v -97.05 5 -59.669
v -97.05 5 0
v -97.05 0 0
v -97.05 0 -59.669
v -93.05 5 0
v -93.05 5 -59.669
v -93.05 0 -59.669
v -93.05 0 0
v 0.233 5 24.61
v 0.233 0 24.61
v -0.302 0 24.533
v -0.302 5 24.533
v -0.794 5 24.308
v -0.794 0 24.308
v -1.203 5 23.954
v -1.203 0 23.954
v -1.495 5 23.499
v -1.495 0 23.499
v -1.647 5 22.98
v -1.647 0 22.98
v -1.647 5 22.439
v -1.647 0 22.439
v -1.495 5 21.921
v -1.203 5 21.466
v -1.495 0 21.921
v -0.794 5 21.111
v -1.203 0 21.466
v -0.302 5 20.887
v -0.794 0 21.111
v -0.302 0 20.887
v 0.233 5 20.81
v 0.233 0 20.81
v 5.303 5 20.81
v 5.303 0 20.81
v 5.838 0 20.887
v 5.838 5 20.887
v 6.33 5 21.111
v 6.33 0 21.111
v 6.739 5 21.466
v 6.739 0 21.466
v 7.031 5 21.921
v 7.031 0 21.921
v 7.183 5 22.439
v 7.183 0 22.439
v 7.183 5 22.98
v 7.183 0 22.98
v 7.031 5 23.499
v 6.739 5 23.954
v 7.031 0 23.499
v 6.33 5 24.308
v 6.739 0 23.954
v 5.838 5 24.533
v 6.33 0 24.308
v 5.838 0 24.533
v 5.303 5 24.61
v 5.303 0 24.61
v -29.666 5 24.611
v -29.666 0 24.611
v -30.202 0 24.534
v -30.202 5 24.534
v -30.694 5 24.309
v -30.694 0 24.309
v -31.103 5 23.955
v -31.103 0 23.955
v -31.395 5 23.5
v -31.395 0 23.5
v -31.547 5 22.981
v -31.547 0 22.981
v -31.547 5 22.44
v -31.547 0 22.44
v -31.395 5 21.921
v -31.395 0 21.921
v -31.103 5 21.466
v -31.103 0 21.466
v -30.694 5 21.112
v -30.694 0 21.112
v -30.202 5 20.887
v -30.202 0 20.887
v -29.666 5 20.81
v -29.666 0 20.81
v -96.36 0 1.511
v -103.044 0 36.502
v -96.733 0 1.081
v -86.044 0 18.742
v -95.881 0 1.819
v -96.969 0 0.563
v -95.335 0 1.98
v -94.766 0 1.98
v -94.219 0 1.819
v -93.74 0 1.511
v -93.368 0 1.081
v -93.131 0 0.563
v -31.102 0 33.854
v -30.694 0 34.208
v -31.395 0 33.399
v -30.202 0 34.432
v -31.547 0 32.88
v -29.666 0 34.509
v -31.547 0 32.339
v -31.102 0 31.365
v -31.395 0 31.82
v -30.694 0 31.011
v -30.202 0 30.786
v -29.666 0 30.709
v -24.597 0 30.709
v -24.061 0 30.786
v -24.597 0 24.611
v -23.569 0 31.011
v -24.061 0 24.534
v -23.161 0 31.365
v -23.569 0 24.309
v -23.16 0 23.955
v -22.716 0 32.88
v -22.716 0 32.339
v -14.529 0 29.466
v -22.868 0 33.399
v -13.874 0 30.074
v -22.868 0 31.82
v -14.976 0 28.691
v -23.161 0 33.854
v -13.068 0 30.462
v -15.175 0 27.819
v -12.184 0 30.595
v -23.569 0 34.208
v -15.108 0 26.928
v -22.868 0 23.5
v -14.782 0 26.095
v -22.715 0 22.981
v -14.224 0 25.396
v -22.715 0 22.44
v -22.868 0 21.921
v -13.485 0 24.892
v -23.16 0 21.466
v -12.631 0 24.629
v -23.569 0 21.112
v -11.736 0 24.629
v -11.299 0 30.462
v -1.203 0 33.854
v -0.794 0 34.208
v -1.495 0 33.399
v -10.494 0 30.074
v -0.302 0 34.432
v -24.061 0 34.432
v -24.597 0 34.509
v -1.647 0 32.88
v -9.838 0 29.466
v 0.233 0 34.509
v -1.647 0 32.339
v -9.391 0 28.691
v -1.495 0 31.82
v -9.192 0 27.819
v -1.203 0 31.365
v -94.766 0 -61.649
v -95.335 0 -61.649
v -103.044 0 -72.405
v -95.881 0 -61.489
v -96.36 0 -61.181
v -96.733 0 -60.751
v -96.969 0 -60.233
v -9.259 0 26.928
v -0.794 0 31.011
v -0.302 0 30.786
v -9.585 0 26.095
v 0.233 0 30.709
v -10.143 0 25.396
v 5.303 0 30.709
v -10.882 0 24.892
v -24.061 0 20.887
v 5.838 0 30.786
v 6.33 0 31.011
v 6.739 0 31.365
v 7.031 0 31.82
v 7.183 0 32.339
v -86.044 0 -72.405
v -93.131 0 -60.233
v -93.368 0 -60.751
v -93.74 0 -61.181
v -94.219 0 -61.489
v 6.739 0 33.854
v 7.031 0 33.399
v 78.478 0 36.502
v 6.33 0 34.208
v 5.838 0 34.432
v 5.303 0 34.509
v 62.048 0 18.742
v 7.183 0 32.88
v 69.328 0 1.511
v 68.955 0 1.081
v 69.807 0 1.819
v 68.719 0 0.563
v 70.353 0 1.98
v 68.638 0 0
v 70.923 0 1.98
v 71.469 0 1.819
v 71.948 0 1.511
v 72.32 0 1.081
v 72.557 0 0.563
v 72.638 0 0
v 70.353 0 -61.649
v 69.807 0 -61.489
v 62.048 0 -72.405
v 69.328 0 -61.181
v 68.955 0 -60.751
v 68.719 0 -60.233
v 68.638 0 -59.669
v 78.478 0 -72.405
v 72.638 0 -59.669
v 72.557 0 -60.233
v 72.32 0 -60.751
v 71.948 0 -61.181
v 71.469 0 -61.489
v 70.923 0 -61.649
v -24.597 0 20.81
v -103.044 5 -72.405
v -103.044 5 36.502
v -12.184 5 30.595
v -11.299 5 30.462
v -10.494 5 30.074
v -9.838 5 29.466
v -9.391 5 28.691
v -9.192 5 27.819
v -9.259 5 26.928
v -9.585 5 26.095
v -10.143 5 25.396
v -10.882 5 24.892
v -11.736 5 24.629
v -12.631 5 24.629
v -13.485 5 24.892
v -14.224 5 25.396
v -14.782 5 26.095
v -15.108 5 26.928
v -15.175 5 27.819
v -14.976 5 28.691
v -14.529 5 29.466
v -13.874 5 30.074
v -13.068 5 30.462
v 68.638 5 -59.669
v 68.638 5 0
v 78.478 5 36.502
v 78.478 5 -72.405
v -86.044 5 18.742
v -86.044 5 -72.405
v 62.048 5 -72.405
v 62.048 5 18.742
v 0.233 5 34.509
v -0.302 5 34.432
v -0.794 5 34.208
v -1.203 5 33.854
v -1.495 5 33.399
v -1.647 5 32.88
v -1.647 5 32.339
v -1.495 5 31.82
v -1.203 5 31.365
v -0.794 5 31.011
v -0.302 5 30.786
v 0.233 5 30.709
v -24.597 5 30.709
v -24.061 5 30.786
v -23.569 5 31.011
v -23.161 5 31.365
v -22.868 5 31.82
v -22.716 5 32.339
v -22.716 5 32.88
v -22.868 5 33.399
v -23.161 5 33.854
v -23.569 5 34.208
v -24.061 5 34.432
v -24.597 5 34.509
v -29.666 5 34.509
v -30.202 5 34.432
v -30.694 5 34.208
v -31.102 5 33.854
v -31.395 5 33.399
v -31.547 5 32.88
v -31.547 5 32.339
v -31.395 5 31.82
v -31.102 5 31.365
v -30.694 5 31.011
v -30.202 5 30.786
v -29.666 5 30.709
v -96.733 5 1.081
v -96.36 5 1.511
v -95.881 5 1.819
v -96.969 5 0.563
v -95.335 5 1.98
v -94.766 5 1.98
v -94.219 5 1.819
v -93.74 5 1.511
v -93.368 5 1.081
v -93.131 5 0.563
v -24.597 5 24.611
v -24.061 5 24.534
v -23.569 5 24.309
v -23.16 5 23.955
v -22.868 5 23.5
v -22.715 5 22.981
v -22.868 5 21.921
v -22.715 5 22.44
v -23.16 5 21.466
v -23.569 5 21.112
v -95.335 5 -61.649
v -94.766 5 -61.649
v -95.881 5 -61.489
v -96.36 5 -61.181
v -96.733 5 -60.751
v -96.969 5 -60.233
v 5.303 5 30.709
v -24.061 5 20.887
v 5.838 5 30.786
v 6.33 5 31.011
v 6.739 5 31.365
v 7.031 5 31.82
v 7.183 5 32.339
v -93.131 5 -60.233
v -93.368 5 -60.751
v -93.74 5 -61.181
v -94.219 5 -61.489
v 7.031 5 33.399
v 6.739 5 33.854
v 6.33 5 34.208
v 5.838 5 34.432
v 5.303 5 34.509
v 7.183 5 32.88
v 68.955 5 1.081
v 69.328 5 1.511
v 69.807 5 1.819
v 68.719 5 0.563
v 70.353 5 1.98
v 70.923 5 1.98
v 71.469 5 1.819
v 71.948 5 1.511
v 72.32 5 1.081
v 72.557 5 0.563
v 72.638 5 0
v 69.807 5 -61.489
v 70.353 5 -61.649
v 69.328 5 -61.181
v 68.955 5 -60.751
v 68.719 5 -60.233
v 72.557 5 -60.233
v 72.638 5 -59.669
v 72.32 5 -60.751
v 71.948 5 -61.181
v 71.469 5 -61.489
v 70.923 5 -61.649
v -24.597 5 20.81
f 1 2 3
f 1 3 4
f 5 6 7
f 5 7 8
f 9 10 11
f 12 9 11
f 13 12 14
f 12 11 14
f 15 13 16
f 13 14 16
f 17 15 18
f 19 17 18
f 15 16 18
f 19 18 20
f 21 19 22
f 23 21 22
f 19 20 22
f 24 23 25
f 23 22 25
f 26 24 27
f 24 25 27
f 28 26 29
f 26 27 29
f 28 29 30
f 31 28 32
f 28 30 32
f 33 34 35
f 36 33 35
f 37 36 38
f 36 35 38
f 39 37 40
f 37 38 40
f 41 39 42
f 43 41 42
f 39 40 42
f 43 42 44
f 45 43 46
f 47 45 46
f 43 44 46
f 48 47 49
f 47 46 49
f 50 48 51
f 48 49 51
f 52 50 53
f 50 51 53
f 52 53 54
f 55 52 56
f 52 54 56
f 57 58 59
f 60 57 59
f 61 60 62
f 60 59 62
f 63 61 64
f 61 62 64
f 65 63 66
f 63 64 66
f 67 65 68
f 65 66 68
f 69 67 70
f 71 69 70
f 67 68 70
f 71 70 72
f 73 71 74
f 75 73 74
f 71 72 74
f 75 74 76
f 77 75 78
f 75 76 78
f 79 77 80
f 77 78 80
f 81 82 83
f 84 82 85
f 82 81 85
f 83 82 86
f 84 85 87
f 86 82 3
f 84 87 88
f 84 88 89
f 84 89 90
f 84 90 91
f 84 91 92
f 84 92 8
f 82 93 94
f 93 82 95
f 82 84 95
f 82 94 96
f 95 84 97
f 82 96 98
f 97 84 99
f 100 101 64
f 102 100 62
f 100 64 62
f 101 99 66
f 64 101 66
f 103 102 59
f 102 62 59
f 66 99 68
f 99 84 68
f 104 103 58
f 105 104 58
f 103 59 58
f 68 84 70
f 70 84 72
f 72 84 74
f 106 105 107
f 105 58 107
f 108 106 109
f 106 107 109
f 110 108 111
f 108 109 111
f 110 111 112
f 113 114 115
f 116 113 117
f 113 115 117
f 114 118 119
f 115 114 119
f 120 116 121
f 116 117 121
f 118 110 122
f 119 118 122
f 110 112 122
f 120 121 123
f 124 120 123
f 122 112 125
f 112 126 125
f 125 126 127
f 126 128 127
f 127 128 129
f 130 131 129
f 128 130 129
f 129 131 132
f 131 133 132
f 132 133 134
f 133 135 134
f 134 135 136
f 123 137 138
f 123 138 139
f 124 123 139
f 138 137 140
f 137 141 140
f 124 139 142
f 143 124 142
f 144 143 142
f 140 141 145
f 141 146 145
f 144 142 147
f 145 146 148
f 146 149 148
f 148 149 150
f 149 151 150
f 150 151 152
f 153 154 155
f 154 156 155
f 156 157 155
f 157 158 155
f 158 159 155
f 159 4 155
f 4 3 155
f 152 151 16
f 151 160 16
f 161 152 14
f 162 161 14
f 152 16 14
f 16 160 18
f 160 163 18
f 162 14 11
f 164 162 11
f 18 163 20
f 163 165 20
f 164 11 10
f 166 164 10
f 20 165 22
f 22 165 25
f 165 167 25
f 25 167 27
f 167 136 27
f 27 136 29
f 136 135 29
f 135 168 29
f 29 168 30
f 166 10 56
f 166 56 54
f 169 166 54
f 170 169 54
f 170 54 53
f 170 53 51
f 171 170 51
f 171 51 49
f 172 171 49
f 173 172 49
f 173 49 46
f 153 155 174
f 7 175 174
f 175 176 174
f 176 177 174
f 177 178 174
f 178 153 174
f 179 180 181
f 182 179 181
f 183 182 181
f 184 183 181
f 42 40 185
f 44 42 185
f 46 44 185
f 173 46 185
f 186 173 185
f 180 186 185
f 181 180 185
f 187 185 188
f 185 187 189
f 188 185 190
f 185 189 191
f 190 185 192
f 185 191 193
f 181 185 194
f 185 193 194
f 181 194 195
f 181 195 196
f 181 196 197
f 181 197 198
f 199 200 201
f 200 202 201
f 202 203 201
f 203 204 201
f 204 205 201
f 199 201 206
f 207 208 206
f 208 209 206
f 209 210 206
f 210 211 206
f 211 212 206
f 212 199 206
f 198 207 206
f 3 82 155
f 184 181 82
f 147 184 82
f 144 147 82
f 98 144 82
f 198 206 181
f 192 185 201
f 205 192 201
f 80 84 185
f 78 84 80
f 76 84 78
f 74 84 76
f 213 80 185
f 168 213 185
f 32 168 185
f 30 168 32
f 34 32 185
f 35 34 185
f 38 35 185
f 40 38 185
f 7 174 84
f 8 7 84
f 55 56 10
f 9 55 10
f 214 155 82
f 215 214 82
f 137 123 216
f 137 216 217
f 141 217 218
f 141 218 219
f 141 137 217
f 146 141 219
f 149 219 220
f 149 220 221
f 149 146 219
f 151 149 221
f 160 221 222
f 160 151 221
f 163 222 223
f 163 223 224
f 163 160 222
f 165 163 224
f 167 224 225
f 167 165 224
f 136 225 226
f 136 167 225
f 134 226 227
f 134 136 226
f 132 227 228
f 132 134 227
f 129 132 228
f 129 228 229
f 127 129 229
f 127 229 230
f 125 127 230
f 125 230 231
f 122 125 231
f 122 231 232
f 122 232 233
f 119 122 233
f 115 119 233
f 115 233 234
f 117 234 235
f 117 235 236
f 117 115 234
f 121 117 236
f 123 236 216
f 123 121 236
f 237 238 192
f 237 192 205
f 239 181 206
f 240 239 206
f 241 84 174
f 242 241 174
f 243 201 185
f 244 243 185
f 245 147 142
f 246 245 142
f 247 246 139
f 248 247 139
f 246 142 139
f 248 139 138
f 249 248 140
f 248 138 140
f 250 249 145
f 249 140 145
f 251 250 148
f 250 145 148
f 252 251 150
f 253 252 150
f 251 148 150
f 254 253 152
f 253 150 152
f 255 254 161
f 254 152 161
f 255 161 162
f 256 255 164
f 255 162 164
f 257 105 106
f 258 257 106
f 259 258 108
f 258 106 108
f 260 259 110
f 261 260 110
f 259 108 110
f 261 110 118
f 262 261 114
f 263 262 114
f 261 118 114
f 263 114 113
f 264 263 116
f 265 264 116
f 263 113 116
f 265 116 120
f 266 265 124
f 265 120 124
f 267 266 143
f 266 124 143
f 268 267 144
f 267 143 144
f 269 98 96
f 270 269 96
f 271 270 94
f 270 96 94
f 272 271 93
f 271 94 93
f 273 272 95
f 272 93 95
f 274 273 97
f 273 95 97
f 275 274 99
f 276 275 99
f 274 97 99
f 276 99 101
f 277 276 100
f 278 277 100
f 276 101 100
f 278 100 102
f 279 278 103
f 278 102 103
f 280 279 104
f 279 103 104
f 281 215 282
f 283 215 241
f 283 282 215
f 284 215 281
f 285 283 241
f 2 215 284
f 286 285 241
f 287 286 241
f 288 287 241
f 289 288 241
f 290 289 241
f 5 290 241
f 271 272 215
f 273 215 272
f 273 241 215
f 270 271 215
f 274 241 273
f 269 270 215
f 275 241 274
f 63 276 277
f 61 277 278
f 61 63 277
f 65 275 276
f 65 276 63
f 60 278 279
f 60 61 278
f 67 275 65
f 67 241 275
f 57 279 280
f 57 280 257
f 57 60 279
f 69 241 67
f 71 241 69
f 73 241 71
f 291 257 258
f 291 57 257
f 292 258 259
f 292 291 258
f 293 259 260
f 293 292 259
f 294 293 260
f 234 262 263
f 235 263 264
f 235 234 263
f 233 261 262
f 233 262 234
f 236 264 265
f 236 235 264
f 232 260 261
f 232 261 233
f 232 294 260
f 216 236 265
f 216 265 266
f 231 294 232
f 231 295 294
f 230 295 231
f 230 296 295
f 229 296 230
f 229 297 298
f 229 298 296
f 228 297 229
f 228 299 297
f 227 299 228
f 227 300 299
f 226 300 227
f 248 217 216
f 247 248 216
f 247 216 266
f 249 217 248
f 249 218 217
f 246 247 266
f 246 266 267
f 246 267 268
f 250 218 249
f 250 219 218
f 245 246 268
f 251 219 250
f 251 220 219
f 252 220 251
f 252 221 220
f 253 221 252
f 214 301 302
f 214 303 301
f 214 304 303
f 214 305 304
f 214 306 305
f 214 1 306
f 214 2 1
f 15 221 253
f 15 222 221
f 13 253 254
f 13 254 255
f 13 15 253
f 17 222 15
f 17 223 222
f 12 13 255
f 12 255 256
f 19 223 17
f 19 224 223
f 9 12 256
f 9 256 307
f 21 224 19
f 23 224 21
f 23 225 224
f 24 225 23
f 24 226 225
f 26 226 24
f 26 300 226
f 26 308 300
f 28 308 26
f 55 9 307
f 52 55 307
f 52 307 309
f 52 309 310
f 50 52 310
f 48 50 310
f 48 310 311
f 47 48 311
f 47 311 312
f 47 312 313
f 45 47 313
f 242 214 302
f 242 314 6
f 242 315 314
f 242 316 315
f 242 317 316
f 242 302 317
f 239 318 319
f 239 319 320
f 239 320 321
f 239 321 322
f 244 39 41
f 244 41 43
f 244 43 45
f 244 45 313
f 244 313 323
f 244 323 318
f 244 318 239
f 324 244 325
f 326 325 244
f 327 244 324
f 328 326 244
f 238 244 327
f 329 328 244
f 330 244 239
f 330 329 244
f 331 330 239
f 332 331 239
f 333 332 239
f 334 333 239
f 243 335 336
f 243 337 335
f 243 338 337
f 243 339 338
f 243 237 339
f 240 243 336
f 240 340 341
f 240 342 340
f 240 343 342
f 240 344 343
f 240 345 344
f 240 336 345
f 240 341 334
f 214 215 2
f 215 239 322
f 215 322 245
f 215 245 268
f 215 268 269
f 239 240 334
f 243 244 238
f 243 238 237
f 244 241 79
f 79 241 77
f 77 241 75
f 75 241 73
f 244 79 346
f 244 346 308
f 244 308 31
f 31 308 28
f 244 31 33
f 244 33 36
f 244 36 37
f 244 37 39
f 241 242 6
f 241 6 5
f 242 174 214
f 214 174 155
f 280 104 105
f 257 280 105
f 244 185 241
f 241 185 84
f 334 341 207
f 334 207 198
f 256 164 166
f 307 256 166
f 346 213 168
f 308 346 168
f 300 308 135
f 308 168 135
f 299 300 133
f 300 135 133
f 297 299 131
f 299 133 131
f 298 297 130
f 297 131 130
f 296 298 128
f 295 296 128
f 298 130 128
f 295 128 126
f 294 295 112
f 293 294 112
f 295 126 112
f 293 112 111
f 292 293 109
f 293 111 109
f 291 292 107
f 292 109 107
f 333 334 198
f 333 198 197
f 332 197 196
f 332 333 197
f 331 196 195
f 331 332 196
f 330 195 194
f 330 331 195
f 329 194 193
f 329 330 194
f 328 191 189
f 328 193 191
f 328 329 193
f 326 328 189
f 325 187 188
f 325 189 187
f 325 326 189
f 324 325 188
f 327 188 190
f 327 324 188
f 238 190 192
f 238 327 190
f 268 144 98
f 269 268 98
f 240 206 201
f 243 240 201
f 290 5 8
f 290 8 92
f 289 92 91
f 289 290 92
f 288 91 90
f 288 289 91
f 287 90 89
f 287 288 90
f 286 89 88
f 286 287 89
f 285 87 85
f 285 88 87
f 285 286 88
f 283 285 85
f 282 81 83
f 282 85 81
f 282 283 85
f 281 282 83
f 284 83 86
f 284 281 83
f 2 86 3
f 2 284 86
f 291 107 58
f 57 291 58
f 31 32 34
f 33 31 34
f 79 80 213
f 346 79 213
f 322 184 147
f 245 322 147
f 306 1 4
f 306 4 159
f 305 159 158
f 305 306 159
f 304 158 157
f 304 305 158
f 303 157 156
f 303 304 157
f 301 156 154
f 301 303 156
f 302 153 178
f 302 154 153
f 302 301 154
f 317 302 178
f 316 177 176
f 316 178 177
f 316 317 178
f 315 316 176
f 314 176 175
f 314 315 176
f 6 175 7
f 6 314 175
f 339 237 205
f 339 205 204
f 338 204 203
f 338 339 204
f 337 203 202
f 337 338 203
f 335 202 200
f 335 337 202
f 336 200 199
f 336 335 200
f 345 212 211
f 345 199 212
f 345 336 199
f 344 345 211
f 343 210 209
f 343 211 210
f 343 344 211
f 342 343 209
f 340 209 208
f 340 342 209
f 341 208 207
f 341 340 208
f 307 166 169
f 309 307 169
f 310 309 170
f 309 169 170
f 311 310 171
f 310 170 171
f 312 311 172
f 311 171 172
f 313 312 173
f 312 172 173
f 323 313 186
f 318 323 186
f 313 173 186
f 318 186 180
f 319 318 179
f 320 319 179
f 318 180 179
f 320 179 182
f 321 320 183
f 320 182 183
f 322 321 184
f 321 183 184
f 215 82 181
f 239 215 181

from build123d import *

# Parameters (mm, degrees)
SKETCH_5_R          = 3
EXTRUDE_4_DEPTH     = 5
CUT_EXTRUDE_2_DEPTH = 8.5
CUT_EXTRUDE_4_DEPTH = 8.5


with BuildPart() as part:
    # 草图5 → 凸台-拉伸4 (new body)
    with BuildSketch(Plane(origin=(0, 0, 0), x_dir=(1, 0, 0), z_dir=(0, 1, 0))):
        Polygon((-103.043555275, 72.404841583), (-103.043555275, -36.501510282), (78.477843527, -36.501510282), (78.477843527, 72.404841583), (62.047530944, 72.404841583), (62.047530944, -18.742135335), (-86.043555275, -18.742135335), (-86.043555275, 72.404841583), align=None)
        with BuildLine():
            Line((0.233182571, -20.809880528), (5.30281271, -20.809880528))
            ThreePointArc((5.30281271, -20.809880528), (7.20281271, -22.709880528), (5.30281271, -24.609880528))
            Line((5.30281271, -24.609880528), (0.233182571, -24.609880528))
            ThreePointArc((0.233182571, -24.609880528), (-1.666817429, -22.709880528), (0.233182571, -20.809880528))
        make_face(mode=Mode.SUBTRACT)
        with BuildLine():
            ThreePointArc((-29.666312365, -34.509375465), (-31.566312365, -32.609375465), (-29.666312365, -30.709375465))
            Line((-29.666312365, -30.709375465), (-24.596682227, -30.709375465))
            ThreePointArc((-24.596682227, -30.709375465), (-22.696682227, -32.609375465), (-24.596682227, -34.509375465))
            Line((-24.596682227, -34.509375465), (-29.666312365, -34.509375465))
        make_face(mode=Mode.SUBTRACT)
        with BuildLine():
            ThreePointArc((-29.666312365, -24.610941368), (-31.566842785, -22.710410948), (-29.666312365, -20.809880528))
            Line((-29.666312365, -20.809880528), (-24.596682227, -20.809880528))
            ThreePointArc((-24.596682227, -20.809880528), (-22.696151807, -22.710410948), (-24.596682227, -24.610941368))
            Line((-24.596682227, -24.610941368), (-29.666312365, -24.610941368))
        make_face(mode=Mode.SUBTRACT)
        with BuildLine():
            ThreePointArc((0.233182571, -34.509375465), (-1.666817429, -32.609375465), (0.233182571, -30.709375465))
            Line((0.233182571, -30.709375465), (5.30281271, -30.709375465))
            ThreePointArc((5.30281271, -30.709375465), (7.20281271, -32.609375465), (5.30281271, -34.509375465))
            Line((5.30281271, -34.509375465), (0.233182571, -34.509375465))
        make_face(mode=Mode.SUBTRACT)
        with Locations((-12.183568637, -27.595158417)):
            Circle(SKETCH_5_R, mode=Mode.SUBTRACT)
    extrude(amount=EXTRUDE_4_DEPTH)

    # 草图5<14> → 切除-拉伸2 (cut, symmetric)
    with BuildSketch(Plane(origin=(0, 0, 0), x_dir=(1, 0, 0), z_dir=(0, 1, 0))):
        with BuildLine():
            Line((-93.050173308, 59.6693943), (-93.050173308, 0))
            ThreePointArc((-93.050173308, 0), (-95.050173308, -2), (-97.050173308, 0))
            Line((-97.050173308, 0), (-97.050173308, 59.6693943))
            ThreePointArc((-97.050173308, 59.6693943), (-95.050173308, 61.6693943), (-93.050173308, 59.6693943))
        make_face()
    extrude(amount=CUT_EXTRUDE_2_DEPTH, both=True, mode=Mode.SUBTRACT)

    # 草图5<16> → 切除-拉伸4 (cut, symmetric)
    with BuildSketch(Plane(origin=(0, 0, 0), x_dir=(1, 0, 0), z_dir=(0, 1, 0))):
        with BuildLine():
            Line((72.637966918, 59.6693943), (72.637966918, 0))
            ThreePointArc((72.637966918, 0), (70.637966918, -2), (68.637966918, 0))
            Line((68.637966918, 0), (68.637966918, 59.6693943))
            ThreePointArc((68.637966918, 59.6693943), (70.637966918, 61.6693943), (72.637966918, 59.6693943))
        make_face()
    extrude(amount=CUT_EXTRUDE_4_DEPTH, both=True, mode=Mode.SUBTRACT)


solid = part.part
